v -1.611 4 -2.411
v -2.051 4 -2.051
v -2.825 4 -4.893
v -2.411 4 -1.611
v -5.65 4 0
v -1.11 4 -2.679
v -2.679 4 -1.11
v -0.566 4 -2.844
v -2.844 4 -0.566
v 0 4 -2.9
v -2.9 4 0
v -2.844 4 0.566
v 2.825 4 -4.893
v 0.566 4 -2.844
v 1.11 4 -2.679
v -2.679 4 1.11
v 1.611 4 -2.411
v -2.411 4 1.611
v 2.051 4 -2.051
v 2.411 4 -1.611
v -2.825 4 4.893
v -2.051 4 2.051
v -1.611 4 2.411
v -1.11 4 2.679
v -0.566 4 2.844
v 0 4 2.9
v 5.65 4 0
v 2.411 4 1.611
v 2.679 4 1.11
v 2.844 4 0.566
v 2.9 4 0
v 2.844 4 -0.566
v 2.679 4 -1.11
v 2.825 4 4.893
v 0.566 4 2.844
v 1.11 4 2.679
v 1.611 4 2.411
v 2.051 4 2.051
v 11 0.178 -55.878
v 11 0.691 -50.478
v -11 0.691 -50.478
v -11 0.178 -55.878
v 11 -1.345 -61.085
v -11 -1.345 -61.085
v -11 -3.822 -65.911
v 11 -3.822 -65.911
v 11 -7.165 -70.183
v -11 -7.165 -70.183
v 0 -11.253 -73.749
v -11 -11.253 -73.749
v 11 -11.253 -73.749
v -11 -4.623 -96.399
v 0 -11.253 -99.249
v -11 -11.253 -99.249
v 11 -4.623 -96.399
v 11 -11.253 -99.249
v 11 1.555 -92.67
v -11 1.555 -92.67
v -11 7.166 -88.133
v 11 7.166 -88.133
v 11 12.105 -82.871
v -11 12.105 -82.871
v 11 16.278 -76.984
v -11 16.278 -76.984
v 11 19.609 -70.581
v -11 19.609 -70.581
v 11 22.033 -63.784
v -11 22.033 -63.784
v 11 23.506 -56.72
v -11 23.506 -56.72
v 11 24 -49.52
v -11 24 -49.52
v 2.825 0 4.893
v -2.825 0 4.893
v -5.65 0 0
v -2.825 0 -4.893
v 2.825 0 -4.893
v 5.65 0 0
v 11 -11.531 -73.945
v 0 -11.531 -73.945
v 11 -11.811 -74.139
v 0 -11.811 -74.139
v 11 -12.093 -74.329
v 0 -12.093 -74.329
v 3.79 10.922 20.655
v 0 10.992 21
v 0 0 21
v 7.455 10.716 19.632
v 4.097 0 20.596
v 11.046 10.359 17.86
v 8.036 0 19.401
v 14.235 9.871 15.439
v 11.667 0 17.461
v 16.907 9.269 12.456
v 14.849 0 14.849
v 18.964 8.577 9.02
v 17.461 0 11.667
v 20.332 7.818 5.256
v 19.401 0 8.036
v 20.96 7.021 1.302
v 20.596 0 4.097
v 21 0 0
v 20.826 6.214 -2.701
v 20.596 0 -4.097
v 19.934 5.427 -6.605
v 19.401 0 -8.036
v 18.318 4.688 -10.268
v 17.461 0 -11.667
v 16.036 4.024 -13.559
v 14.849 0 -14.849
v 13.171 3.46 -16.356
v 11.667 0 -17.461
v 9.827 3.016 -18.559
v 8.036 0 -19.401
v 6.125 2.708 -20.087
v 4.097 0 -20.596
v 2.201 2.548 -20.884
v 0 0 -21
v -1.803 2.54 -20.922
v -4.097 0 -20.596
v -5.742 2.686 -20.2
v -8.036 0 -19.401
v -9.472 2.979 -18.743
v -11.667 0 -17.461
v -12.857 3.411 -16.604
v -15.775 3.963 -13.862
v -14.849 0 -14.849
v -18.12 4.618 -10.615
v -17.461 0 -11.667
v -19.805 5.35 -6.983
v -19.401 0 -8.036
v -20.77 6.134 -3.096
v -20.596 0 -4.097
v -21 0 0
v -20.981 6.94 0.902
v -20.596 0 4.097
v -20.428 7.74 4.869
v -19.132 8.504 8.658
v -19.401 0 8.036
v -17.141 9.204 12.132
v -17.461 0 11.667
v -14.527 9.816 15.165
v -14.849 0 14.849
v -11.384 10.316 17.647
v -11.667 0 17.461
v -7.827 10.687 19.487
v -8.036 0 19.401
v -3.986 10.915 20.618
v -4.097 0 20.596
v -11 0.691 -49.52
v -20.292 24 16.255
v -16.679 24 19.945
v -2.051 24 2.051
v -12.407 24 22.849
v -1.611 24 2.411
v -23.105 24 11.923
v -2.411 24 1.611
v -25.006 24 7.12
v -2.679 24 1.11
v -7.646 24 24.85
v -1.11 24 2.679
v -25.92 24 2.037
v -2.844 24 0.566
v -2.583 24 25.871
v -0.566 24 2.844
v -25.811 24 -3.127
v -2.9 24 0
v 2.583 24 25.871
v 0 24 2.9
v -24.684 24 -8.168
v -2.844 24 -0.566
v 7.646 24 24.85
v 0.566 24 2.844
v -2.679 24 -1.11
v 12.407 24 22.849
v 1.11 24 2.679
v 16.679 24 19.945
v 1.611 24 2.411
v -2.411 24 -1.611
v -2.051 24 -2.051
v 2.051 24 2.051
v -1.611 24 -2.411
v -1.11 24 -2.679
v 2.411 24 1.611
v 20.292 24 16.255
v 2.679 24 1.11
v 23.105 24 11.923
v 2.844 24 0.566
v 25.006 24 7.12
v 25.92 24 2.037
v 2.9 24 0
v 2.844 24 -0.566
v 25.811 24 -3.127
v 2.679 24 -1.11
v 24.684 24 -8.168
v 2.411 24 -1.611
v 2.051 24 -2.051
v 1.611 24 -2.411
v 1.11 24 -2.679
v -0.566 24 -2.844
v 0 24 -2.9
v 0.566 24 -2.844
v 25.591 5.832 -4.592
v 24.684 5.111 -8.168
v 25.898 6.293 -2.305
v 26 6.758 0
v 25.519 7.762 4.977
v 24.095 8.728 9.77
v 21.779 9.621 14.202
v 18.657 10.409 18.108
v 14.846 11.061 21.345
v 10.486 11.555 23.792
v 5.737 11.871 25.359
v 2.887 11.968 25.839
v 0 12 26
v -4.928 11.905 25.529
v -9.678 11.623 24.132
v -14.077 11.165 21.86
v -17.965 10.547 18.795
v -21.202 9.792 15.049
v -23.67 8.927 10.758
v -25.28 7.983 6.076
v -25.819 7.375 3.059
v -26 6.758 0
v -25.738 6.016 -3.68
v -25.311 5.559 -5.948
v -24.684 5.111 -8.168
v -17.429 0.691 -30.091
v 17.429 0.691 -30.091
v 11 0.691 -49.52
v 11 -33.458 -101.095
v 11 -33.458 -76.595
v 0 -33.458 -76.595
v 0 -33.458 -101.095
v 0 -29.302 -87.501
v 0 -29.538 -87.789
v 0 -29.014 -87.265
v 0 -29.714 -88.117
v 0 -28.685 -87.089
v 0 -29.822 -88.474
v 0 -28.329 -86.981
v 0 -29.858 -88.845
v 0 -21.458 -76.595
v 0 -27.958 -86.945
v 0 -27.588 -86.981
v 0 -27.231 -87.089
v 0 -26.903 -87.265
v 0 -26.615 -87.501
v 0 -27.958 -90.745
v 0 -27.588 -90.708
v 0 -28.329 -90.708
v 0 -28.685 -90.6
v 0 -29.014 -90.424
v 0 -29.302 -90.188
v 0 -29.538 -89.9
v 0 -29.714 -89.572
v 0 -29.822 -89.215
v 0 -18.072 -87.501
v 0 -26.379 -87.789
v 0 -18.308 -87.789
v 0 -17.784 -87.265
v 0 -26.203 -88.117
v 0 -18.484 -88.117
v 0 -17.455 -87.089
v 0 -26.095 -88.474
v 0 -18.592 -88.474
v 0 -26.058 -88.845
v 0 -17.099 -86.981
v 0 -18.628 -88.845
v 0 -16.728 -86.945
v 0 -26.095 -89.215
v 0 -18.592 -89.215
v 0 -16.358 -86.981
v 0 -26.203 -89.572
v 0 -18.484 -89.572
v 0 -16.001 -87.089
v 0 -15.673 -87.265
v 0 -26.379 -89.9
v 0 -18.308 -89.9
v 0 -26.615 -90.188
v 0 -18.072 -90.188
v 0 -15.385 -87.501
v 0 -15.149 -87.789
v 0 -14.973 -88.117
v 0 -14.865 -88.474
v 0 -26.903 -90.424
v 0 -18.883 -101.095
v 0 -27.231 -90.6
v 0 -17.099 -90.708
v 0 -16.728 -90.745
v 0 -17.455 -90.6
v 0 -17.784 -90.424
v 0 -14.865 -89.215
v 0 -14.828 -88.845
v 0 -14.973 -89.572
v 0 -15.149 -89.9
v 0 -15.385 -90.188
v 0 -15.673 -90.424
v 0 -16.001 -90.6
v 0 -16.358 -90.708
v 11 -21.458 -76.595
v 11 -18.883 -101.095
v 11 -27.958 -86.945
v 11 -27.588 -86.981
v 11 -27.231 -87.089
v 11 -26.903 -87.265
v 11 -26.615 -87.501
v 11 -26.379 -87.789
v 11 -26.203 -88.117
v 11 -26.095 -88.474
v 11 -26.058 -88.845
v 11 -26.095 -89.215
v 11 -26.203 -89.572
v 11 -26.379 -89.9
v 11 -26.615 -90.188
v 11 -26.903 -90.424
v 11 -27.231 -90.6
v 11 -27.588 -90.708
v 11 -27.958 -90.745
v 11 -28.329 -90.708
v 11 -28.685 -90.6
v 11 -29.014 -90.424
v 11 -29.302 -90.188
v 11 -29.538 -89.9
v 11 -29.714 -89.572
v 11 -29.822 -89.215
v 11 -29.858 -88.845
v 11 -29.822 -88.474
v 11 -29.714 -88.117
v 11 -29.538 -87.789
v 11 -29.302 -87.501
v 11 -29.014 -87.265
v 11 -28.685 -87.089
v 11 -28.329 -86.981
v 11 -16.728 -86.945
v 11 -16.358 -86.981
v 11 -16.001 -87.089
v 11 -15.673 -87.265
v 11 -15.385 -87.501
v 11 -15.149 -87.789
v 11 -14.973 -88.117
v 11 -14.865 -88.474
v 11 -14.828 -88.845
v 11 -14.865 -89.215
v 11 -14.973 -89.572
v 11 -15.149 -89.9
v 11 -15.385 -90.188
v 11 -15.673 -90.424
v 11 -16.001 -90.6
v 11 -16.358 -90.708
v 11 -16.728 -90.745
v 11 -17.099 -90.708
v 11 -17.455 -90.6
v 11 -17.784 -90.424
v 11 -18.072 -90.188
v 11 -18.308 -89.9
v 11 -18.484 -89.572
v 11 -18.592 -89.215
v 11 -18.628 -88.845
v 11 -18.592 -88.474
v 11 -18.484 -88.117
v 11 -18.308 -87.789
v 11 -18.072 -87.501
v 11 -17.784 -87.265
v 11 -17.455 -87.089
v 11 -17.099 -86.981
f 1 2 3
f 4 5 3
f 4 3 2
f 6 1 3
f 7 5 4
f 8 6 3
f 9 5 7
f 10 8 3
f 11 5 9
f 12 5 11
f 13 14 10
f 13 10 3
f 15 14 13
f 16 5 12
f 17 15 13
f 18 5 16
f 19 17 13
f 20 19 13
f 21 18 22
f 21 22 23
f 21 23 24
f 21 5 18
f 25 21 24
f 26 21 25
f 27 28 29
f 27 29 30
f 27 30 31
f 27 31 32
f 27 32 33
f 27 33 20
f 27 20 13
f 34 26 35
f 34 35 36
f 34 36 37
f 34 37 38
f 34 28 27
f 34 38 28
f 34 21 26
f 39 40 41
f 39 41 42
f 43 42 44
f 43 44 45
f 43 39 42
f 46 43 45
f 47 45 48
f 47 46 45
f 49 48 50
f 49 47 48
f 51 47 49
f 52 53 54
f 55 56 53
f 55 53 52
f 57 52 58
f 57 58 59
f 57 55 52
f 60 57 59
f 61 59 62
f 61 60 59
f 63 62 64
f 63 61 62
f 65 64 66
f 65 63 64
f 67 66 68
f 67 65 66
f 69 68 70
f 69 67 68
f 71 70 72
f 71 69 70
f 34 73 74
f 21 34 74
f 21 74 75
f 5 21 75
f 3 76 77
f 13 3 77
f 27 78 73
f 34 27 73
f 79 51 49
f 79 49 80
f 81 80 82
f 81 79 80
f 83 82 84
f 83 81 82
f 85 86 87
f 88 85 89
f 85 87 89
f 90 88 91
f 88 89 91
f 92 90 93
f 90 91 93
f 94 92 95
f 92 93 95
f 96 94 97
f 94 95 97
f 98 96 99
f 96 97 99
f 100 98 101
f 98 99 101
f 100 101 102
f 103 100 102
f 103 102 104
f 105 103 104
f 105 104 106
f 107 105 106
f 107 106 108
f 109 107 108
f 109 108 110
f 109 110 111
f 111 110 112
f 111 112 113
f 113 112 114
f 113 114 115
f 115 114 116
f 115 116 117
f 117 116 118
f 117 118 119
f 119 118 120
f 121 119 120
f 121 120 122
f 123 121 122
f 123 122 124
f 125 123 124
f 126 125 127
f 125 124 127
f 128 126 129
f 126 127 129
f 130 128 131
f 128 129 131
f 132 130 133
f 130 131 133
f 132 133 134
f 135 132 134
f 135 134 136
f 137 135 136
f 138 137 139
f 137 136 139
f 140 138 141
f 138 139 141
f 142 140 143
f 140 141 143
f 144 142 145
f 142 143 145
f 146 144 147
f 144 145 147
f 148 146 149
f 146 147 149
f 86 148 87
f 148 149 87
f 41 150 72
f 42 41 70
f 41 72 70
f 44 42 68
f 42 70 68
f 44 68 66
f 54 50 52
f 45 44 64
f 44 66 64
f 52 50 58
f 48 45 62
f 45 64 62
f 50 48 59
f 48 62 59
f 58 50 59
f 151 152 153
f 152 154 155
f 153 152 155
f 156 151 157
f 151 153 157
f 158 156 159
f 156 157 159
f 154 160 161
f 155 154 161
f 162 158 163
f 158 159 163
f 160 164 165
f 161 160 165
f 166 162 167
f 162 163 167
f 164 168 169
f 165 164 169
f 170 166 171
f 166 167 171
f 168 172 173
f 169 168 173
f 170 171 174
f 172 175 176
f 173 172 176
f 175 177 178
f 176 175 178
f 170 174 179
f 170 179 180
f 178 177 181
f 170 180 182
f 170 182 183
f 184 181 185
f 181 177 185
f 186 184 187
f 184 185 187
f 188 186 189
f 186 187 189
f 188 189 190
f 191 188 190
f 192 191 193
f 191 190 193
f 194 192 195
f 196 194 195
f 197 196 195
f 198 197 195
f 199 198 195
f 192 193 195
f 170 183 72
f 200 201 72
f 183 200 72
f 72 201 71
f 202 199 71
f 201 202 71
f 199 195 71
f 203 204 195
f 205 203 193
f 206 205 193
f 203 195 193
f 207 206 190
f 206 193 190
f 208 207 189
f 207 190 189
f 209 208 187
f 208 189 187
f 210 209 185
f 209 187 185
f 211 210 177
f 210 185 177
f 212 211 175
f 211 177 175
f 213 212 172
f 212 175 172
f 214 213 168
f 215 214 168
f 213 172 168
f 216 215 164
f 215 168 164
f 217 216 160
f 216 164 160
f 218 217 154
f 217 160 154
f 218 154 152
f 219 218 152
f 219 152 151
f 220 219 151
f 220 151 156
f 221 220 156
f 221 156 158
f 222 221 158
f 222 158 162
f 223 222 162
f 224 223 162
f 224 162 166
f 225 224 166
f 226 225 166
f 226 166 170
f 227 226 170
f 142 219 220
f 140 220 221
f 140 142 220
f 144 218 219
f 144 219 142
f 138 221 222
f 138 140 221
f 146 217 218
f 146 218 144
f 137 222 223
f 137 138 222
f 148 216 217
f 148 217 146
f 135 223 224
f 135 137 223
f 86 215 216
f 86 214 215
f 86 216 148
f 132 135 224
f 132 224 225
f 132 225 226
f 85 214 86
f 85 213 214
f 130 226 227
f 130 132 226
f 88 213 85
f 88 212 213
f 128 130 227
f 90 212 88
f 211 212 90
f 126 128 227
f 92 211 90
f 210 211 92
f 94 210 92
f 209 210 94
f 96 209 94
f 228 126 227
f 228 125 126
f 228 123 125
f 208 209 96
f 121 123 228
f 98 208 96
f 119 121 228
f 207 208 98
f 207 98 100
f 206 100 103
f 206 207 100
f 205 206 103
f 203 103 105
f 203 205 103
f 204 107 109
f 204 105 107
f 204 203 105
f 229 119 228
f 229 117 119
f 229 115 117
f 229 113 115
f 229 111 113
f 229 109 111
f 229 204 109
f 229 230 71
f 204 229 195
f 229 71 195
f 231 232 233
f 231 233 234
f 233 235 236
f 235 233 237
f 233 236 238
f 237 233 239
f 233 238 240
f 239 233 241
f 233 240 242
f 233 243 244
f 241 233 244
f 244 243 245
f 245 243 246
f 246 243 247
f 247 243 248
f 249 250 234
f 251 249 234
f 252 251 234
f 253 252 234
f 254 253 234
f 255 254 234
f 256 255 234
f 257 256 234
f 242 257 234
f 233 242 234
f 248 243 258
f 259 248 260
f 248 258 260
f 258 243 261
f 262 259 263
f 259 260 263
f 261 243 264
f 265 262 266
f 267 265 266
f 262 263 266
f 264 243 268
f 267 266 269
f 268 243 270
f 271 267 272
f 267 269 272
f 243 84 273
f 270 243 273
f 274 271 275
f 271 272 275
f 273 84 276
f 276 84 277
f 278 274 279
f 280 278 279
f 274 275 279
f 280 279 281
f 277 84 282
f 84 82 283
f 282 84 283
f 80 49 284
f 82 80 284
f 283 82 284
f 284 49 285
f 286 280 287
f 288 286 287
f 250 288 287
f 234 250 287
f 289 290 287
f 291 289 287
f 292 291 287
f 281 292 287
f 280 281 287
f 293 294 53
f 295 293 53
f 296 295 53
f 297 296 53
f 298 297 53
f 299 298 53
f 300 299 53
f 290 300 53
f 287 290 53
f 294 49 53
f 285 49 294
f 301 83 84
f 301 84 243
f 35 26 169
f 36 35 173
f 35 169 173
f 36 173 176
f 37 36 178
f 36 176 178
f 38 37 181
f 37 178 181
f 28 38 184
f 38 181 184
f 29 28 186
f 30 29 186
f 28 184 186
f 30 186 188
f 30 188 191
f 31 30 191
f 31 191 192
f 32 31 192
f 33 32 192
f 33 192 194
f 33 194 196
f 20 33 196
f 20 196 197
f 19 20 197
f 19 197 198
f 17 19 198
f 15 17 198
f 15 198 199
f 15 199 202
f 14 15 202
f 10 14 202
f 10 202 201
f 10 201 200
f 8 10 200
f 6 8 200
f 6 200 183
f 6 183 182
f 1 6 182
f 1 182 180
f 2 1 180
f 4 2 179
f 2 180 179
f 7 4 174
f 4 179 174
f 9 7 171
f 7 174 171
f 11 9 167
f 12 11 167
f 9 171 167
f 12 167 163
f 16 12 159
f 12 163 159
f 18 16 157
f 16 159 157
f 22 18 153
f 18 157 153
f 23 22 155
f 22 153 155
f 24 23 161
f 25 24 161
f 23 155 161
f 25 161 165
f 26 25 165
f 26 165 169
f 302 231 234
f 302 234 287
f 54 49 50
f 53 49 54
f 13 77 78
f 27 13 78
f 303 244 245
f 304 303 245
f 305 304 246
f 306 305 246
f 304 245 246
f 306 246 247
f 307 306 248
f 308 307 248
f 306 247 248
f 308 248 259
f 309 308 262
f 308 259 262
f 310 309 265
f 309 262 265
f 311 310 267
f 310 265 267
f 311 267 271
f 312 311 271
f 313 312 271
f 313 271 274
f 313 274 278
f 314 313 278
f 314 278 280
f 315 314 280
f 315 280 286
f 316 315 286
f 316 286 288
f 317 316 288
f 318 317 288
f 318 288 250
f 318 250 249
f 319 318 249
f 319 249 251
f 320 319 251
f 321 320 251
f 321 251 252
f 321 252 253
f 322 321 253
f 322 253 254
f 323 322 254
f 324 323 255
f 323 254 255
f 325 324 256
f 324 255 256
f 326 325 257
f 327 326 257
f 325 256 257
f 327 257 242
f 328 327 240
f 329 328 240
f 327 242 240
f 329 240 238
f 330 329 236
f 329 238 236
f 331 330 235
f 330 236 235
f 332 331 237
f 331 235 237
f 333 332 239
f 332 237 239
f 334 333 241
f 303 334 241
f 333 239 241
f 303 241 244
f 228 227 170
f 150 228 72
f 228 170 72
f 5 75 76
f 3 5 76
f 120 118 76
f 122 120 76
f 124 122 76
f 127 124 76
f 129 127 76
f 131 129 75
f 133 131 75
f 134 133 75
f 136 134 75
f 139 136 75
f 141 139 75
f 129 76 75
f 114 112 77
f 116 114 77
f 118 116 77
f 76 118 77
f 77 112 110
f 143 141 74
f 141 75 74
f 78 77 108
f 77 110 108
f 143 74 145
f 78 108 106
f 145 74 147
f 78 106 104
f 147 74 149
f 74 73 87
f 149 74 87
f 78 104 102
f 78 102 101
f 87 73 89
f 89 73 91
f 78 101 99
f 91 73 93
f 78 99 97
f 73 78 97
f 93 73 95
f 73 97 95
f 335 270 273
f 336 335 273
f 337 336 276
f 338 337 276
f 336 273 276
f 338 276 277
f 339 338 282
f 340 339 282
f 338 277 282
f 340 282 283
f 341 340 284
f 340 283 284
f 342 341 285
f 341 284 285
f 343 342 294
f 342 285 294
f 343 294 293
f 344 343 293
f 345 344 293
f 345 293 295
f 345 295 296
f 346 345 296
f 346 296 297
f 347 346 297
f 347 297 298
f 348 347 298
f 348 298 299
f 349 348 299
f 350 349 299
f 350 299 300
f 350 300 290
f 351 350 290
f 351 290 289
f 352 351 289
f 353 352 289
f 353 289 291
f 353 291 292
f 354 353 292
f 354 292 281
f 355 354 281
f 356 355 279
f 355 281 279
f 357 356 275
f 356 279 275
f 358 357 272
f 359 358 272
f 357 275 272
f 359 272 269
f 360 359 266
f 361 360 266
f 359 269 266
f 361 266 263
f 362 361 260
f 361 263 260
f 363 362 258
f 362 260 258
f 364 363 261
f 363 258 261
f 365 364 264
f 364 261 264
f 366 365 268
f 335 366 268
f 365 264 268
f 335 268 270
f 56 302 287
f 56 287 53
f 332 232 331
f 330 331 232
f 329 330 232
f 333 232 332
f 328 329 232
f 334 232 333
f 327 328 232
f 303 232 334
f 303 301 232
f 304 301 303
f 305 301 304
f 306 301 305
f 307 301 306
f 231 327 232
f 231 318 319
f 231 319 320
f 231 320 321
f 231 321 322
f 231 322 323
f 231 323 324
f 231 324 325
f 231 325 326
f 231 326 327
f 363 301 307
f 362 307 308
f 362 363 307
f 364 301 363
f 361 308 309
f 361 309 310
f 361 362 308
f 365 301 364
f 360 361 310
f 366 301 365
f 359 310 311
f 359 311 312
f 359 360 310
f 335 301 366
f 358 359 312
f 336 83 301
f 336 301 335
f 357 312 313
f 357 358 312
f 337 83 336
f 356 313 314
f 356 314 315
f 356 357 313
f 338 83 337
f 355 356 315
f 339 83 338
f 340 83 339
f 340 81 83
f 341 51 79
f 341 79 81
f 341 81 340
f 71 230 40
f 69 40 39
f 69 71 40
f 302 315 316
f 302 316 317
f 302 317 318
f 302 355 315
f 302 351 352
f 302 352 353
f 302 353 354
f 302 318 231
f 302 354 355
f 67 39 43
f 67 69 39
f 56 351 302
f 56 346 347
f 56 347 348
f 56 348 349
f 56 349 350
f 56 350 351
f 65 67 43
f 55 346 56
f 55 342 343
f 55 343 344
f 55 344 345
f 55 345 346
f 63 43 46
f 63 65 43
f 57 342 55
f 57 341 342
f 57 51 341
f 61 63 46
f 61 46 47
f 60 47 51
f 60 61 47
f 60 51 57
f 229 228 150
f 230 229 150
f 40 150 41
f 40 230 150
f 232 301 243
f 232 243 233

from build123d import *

# Parameters (mm, degrees)
CROQUIS1_R              = 21
SALIENTE_EXTRUIR1_DEPTH = 24
CROQUIS2_R              = 2.9
CORTAR_EXTRUIR1_DEPTH   = 30
CROQUIS3_R              = 26
SALIENTE_EXTRUIR2_DEPTH = 12
SALIENTE_EXTRUIR3_DEPTH = 26
CROQUIS6_W              = 19.429
CROQUIS6_H              = 23.308672713
SALIENTE_EXTRUIR4_DEPTH = 52
CORTAR_EXTRUIR2_DEPTH   = 61.862693955
SALIENTE_EXTRUIR5_DEPTH = 11
SALIENTE_EXTRUIR6_DEPTH = 11
CROQUIS10_R             = 1.9
CORTAR_EXTRUIR3_DEPTH   = 110.615590995
CROQUIS11_R             = 2.9
CORTAR_EXTRUIR4_DEPTH   = 120.153595066
CORTAR_EXTRUIR5_DEPTH   = 4


with BuildPart() as part:
    # Croquis1 → Saliente-Extruir1 (new body)
    with BuildSketch(Plane(origin=(0, 0, 0), x_dir=(1, 0, 0), z_dir=(0, 1, 0))):
        with Locations(Location((0, 0, 0), (0, 0, 270))):
            Circle(CROQUIS1_R)
    extrude(amount=SALIENTE_EXTRUIR1_DEPTH)

    # Croquis2 → Cortar-Extruir1 (cut, symmetric)
    with BuildSketch(Plane(origin=(0, 24, 0), x_dir=(1, 0, 0), z_dir=(0, 1, 0))):
        with Locations(Location((0, 0, 0), (0, 0, 270))):
            Circle(CROQUIS2_R)
    extrude(amount=CORTAR_EXTRUIR1_DEPTH, both=True, mode=Mode.SUBTRACT)

    # Croquis3 → Saliente-Extruir2 (add)
    with BuildSketch(Plane(origin=(0, 24, 0), x_dir=(1, 0, 0), z_dir=(0, 1, 0))):
        with Locations(Location((0, 0, 0), (0, 0, 270))):
            Circle(CROQUIS3_R)
    extrude(amount=-SALIENTE_EXTRUIR2_DEPTH)

    # Croquis4 → Saliente-Extruir3 (add, symmetric)
    with BuildSketch(Plane(origin=(0, 0, 0), x_dir=(0, 0, -1), z_dir=(1, 0, 0))):
        Polygon((-26, 13.930297777), (-26, 12), (30.091374751, 0.691327287), (30.091374751, 24), (-26, 24), align=None)
    extrude(amount=SALIENTE_EXTRUIR3_DEPTH, both=True)

    # Croquis6 → Saliente-Extruir4 (add)
    with BuildSketch(Plane(origin=(26, 0, 0), x_dir=(0, 0, -1), z_dir=(1, 0, 0))):
        with Locations((39.805874751, 12.345663644)):
            Rectangle(CROQUIS6_W, CROQUIS6_H)
    extrude(amount=-SALIENTE_EXTRUIR4_DEPTH)

    # Croquis5 → Cortar-Extruir2 (cut, through all)
    with BuildSketch(Plane(origin=(0, 24, 0), x_dir=(1, 0, 0), z_dir=(0, 1, 0))):
        with BuildLine():
            Line((-31.296292427, 177.340731999), (24.68369475, 8.167938142))
            ThreePointArc((24.68369475, 8.167938142), (0, -26), (-24.68369475, 8.167938142))
            Line((-24.68369475, 8.167938142), (-11, 49.520374751))
            Line((-11, 49.520374751), (11, 49.520374751))
            Line((11, 49.520374751), (24.68369475, 8.167938142))
            Line((24.68369475, 8.167938142), (26, 49.520374751))
            Line((26, 49.520374751), (11, 49.520374751))
            Line((11, 49.520374751), (-167.194256769, 49.520374751))
            Line((-167.194256769, 49.520374751), (76.977143024, -210.081435923))
            Line((76.977143024, -210.081435923), (212.875107366, -82.261078675))
            Line((212.875107366, -82.261078675), (-31.296292427, 177.340731999))
        make_face()
    extrude(amount=-CORTAR_EXTRUIR2_DEPTH, mode=Mode.SUBTRACT)


with BuildPart() as cortar_extruir2_kept_piece:
    # of the separate pieces the step leaves, the one the design keeps (cortar_extruir2_pieces_kept)
    add(part.part.solids().sort_by_distance((0, 0, 21))[0])

    # Croquis7 → Saliente-Extruir5 (add, symmetric)
    with BuildSketch(Plane(origin=(0, 0, 0), x_dir=(0, 0, -1), z_dir=(1, 0, 0))):
        with BuildLine():
            Line((49.520374751, 24), (49.520374751, 0.691327287))
            Line((49.520374751, 0.691327287), (50.478144868, 0.691327287))
            ThreePointArc((50.478144868, 0.691327287), (63.55673371, -2.469267031), (73.748722442, -11.253469229))
            Line((73.748722442, -11.253469229), (99.248722442, -11.253469229))
            ThreePointArc((99.248722442, -11.253469229), (79.998709912, 14.292570123), (49.520374751, 24))
        make_face()
    extrude(amount=SALIENTE_EXTRUIR5_DEPTH, both=True)

    # Croquis9 → Saliente-Extruir6 (add)
    with BuildSketch(Plane(origin=(11, 0, 0), x_dir=(0, 0, -1), z_dir=(1, 0, 0))):
        with BuildLine():
            Line((101.09458803, -18.883363084), (99.248722442, -11.253469229))
            Line((99.248722442, -11.253469229), (73.748722442, -11.253469229))
            ThreePointArc((73.748722483, -11.2534692), (74.042597019, -11.670890415), (74.32898512, -12.093483089))
            ThreePointArc((74.32898512, -12.093483089), (77.894859555, -19.667595219), (79.118326526, -27.949247445))
            ThreePointArc((79.118326526, -27.949247445), (78.984304271, -30.716755499), (78.583491791, -33.458363084))
            Line((78.583491791, -33.458363084), (101.09458803, -33.458363084))
            Line((101.09458803, -33.458363084), (101.09458803, -18.883363084))
        make_face()
        with BuildLine():
            ThreePointArc((79.118326526, -27.949247445), (77.894859555, -19.667595219), (74.32898512, -12.093483089))
            Line((74.32898512, -12.093483089), (76.59458803, -21.458363084))
            Line((76.59458803, -21.458363084), (76.59458803, -33.458363084))
            Line((76.59458803, -33.458363084), (78.583491791, -33.458363084))
            ThreePointArc((78.583491791, -33.458363084), (78.984304271, -30.716755499), (79.118326526, -27.949247445))
        make_face()
    extrude(amount=-SALIENTE_EXTRUIR6_DEPTH)

    # Croquis10 → Cortar-Extruir3 (cut, through all)
    with BuildSketch(Plane.ZY):
        with Locations((-88.84458803, -27.958363084)):
            Circle(CROQUIS10_R)
        with Locations((-88.84458803, -16.728363084)):
            Circle(CROQUIS10_R)
    extrude(amount=-CORTAR_EXTRUIR3_DEPTH, mode=Mode.SUBTRACT)

    # Croquis11 → Cortar-Extruir4 (cut, through all)
    with BuildSketch(Plane(origin=(0, 24, 0), x_dir=(1, 0, 0), z_dir=(0, 1, 0))):
        with Locations(Location((0, 0, 0), (0, 0, 270))):
            Circle(CROQUIS11_R)
    extrude(amount=-CORTAR_EXTRUIR4_DEPTH, mode=Mode.SUBTRACT)

    # Croquis12 → Cortar-Extruir5 (cut)
    with BuildSketch(Plane.XZ):
        Polygon((2.825, 4.893043531), (-2.825, 4.893043531), (-5.65, 0), (-2.825, -4.893043531), (2.825, -4.893043531), (5.65, 0), align=None)
    extrude(amount=-CORTAR_EXTRUIR5_DEPTH, mode=Mode.SUBTRACT)


solid = cortar_extruir2_kept_piece.part
